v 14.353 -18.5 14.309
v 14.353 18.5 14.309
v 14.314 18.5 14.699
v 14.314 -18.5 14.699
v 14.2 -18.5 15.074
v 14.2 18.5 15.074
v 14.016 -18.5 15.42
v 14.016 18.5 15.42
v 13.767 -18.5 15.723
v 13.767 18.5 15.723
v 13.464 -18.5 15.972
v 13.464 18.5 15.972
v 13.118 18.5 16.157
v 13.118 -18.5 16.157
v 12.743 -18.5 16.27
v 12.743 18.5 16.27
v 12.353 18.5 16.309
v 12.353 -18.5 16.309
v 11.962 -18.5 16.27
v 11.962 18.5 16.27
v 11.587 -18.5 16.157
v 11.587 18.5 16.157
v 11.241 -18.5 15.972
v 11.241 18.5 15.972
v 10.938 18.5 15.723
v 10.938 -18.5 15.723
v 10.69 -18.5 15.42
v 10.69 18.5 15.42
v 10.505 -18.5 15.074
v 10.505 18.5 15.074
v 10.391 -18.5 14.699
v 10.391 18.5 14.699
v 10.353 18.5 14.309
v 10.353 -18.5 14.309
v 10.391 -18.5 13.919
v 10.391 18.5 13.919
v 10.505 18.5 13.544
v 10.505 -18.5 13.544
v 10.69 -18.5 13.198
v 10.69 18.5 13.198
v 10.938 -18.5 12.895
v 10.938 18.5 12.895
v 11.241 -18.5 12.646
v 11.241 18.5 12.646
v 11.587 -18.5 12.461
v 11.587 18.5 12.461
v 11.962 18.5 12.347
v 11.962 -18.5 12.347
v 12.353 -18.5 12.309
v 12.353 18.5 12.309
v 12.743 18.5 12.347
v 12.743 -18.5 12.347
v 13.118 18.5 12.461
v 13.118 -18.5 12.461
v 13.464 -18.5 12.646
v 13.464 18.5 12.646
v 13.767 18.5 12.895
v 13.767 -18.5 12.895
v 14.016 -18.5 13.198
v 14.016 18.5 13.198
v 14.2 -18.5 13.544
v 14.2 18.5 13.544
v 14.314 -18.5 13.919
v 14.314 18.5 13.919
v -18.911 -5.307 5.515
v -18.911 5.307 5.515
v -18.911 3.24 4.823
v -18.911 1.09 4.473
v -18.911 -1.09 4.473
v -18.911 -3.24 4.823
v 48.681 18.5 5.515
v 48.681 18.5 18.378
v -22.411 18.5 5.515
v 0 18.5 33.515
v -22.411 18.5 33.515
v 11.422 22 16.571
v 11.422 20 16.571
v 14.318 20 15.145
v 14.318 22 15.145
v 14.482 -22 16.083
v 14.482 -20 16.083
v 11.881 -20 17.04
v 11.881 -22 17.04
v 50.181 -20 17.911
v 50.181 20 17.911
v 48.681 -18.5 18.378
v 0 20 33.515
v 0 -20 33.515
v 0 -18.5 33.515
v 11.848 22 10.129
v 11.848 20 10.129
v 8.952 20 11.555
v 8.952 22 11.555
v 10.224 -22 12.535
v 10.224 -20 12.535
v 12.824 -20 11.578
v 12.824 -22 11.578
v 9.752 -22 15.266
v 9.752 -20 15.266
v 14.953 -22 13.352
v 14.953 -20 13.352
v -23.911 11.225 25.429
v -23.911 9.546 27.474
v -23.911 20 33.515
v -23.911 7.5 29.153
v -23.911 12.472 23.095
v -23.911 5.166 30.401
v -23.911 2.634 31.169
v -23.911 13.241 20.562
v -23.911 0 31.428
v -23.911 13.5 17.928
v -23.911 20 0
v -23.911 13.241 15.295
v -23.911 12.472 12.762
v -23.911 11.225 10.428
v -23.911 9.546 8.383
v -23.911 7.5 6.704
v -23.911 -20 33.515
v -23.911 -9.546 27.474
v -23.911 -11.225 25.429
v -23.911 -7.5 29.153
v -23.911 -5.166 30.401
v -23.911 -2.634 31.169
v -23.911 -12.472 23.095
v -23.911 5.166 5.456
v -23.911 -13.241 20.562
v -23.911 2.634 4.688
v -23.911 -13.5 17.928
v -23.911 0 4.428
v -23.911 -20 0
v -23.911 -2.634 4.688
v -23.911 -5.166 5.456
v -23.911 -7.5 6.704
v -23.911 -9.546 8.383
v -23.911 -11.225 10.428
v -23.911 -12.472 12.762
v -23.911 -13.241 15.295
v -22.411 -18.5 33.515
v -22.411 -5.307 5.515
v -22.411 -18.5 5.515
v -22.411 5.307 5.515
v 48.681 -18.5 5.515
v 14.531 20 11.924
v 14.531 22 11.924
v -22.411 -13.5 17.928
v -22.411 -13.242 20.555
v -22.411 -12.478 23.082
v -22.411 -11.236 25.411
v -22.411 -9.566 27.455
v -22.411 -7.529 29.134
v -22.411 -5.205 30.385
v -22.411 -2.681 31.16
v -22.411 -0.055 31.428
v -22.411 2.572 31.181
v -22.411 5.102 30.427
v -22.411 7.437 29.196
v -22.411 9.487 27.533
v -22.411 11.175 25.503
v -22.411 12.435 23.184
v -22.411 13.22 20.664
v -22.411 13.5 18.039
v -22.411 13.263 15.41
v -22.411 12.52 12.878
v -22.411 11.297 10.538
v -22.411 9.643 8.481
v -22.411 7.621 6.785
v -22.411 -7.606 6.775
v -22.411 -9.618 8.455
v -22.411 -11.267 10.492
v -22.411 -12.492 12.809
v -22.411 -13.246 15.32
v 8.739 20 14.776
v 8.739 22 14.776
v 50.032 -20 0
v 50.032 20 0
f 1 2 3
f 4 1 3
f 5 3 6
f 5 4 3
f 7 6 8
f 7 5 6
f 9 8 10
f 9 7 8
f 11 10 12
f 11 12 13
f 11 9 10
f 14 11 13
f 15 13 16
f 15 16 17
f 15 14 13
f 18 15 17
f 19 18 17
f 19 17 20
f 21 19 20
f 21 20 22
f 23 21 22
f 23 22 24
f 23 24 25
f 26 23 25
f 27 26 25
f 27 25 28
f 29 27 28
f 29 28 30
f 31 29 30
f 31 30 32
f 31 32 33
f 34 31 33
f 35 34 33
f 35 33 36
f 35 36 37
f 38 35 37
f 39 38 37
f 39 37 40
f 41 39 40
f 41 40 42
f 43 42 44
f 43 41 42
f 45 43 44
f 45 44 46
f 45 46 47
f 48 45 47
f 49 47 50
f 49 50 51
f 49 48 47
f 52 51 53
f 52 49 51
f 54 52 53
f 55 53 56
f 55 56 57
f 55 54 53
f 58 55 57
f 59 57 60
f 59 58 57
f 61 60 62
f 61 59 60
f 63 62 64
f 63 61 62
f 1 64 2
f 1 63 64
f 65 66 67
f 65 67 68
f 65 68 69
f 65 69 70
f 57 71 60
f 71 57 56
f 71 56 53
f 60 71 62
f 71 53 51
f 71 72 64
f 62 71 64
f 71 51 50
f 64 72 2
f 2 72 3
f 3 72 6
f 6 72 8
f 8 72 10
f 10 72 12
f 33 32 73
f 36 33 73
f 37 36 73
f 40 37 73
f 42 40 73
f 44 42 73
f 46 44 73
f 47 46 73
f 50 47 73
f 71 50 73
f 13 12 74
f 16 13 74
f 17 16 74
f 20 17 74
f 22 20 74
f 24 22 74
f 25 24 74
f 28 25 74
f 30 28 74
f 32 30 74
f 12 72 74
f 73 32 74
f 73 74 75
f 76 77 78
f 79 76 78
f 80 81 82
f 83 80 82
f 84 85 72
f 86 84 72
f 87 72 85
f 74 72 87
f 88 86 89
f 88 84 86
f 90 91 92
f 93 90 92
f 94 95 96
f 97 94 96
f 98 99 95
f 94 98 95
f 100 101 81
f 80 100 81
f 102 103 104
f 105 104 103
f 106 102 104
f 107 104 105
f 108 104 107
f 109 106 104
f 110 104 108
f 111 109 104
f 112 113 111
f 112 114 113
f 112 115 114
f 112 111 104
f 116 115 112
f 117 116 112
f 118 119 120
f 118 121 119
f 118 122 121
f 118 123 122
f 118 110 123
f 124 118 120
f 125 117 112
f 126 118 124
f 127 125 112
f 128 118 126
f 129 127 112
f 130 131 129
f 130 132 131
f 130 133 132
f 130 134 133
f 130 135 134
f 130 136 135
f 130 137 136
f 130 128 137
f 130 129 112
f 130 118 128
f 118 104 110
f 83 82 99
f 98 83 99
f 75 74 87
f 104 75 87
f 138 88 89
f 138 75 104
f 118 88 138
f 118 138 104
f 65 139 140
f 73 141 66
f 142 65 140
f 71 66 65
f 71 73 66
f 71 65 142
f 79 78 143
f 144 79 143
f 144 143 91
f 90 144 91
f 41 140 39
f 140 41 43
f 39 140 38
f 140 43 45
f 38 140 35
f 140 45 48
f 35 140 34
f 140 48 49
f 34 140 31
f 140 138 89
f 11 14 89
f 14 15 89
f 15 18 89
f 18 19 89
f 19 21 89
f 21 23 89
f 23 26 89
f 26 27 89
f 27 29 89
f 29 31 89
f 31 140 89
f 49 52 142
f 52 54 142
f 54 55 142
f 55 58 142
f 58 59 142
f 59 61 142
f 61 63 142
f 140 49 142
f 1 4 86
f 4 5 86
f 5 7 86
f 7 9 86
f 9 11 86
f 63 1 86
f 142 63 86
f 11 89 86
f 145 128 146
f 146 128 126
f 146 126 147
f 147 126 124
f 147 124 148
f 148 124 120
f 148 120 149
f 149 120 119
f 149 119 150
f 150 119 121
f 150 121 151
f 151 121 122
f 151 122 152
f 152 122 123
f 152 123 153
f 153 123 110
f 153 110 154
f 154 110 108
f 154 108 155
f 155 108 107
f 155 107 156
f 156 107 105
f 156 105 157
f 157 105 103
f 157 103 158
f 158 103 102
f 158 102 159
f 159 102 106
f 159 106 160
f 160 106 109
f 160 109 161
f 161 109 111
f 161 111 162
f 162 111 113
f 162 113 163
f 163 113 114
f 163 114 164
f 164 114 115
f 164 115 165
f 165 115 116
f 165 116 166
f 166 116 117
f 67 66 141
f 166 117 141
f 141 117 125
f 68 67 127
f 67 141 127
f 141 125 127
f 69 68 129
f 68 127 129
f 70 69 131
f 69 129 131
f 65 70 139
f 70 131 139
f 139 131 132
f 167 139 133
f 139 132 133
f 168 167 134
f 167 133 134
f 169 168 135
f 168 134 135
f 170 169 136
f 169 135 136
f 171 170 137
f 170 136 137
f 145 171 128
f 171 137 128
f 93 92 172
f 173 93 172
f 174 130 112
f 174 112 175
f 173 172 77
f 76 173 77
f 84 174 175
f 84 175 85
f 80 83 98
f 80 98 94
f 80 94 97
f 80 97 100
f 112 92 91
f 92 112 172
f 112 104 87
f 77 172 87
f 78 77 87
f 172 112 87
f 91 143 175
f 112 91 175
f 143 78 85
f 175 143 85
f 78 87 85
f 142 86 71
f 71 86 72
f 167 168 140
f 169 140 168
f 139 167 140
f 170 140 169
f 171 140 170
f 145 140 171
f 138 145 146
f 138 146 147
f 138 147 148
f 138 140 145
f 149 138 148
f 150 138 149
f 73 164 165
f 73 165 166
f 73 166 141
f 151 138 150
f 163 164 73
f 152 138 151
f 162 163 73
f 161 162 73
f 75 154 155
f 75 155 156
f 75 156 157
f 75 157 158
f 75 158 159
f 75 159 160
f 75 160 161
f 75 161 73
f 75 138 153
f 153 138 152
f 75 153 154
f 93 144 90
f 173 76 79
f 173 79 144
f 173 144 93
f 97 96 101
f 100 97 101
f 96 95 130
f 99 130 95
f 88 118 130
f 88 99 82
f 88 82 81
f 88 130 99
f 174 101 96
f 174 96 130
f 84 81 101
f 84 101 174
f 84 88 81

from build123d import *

# Parameters (mm, degrees)
F1_DEPTH  = 20
F3_W      = 22.4105001092
F3_H      = 37
F3_W_2    = 48.6809194684
F4_DEPTH  = 28
F5_R      = 2
F6_DEPTH  = 2
F7_DEPTH  = 40
F8_DEPTH  = 2
F10_DEPTH = 2
F11_R     = 13.5
F12_DEPTH = 5


with BuildPart() as f1:
    # F0 (on Front) → F1 (new body)
    with BuildSketch(Plane.XZ):
        Polygon((-23.9105001092, 33.5152801126), (-23.9105001092, 0), (50.0319972634, 0), (50.1809194684, 17.9111845791), (0, 33.5152801126), align=None)
    extrude(amount=F1_DEPTH)

    # F2: F1 across face


with BuildPart() as f1_1:
    add(f1.part)
    add(f1.part.mirror(Plane(origin=(9.3059845029, 0, 14.6000769053), x_dir=(1, 0, 0), z_dir=(0, 1, 0))))

    # F3 (on face) → F4 (cut)
    with BuildSketch(Plane.XY.offset(33.5152801126)):
        with Locations((-11.2052500546, 0)):
            Rectangle(F3_W, F3_H)
        with Locations((24.3404597342, 0)):
            Rectangle(F3_W_2, F3_H)
    extrude(amount=-F4_DEPTH, mode=Mode.SUBTRACT)

    # F5 (on face) → F6 (join)
    with BuildSketch(Plane.XZ.offset(20)):
        Polygon((14.9534574564, 13.3521119993), (14.4816109652, 16.0829288897), (11.8807309195, 17.0397062869), (9.7516973649, 15.2656667936), (10.2235438561, 12.5348499033), (12.8244239018, 11.5780725061), align=None)
        with Locations((12.3525774106, 14.3088893965)):
            Circle(F5_R, mode=Mode.SUBTRACT)
    extrude(amount=F6_DEPTH)

    # F7 (add): a face of the model
    f7_faces = [f1_1.faces().sort_by_distance(p)[0] for p in [
        (12.3525774106, -20, 14.3088893965),
    ]]
    extrude(f7_faces, amount=-F7_DEPTH)

    # F8 (add): a face of the model
    f8_faces = [f1_1.faces().sort_by_distance(p)[0] for p in [
        (12.3525774106, -20, 14.3088893965),
    ]]
    extrude(f8_faces, amount=F8_DEPTH)

    # F9 (on face) → F10 (join)
    with BuildSketch(Plane(origin=(0, 20, 0), x_dir=(-1, 0, 0), z_dir=(0, 1, 0))):
        Polygon((-8.9518631259, 11.5546170938), (-8.7388157611, 14.7756681167), (-11.4218040914, 16.5706980583), (-14.3178397865, 15.144676977), (-14.5308871513, 11.9236259541), (-11.847898821, 10.1285960125), align=None)
    extrude(amount=F10_DEPTH)

    # F11 (on face) → F12 (cut)
    with BuildSketch(Plane(origin=(-23.9105001092, 0, 0), x_dir=(0, -1, 0), z_dir=(-1, 0, 0))):
        with Locations((0, 17.928481102)):
            Circle(F11_R)
    extrude(amount=-F12_DEPTH, mode=Mode.SUBTRACT)


solid = f1_1.part
